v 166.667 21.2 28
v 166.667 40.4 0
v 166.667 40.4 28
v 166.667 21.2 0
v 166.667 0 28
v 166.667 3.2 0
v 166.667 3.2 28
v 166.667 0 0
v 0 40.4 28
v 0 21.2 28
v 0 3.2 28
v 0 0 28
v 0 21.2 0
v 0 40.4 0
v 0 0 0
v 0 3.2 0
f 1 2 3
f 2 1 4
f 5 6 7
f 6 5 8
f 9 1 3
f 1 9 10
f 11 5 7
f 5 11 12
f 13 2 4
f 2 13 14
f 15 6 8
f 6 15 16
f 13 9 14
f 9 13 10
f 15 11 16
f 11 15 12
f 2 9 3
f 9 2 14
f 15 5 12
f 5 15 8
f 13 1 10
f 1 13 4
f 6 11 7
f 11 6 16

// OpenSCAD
/*
Top rim rail for X-direction sides.
Print orientation: print flat on the long rectangular face, open channel upward.
Quantity: three segments per X side when matching the wall tile columns.
*/

use <../planter_support_free.scad>

export_rim_rail_x();
